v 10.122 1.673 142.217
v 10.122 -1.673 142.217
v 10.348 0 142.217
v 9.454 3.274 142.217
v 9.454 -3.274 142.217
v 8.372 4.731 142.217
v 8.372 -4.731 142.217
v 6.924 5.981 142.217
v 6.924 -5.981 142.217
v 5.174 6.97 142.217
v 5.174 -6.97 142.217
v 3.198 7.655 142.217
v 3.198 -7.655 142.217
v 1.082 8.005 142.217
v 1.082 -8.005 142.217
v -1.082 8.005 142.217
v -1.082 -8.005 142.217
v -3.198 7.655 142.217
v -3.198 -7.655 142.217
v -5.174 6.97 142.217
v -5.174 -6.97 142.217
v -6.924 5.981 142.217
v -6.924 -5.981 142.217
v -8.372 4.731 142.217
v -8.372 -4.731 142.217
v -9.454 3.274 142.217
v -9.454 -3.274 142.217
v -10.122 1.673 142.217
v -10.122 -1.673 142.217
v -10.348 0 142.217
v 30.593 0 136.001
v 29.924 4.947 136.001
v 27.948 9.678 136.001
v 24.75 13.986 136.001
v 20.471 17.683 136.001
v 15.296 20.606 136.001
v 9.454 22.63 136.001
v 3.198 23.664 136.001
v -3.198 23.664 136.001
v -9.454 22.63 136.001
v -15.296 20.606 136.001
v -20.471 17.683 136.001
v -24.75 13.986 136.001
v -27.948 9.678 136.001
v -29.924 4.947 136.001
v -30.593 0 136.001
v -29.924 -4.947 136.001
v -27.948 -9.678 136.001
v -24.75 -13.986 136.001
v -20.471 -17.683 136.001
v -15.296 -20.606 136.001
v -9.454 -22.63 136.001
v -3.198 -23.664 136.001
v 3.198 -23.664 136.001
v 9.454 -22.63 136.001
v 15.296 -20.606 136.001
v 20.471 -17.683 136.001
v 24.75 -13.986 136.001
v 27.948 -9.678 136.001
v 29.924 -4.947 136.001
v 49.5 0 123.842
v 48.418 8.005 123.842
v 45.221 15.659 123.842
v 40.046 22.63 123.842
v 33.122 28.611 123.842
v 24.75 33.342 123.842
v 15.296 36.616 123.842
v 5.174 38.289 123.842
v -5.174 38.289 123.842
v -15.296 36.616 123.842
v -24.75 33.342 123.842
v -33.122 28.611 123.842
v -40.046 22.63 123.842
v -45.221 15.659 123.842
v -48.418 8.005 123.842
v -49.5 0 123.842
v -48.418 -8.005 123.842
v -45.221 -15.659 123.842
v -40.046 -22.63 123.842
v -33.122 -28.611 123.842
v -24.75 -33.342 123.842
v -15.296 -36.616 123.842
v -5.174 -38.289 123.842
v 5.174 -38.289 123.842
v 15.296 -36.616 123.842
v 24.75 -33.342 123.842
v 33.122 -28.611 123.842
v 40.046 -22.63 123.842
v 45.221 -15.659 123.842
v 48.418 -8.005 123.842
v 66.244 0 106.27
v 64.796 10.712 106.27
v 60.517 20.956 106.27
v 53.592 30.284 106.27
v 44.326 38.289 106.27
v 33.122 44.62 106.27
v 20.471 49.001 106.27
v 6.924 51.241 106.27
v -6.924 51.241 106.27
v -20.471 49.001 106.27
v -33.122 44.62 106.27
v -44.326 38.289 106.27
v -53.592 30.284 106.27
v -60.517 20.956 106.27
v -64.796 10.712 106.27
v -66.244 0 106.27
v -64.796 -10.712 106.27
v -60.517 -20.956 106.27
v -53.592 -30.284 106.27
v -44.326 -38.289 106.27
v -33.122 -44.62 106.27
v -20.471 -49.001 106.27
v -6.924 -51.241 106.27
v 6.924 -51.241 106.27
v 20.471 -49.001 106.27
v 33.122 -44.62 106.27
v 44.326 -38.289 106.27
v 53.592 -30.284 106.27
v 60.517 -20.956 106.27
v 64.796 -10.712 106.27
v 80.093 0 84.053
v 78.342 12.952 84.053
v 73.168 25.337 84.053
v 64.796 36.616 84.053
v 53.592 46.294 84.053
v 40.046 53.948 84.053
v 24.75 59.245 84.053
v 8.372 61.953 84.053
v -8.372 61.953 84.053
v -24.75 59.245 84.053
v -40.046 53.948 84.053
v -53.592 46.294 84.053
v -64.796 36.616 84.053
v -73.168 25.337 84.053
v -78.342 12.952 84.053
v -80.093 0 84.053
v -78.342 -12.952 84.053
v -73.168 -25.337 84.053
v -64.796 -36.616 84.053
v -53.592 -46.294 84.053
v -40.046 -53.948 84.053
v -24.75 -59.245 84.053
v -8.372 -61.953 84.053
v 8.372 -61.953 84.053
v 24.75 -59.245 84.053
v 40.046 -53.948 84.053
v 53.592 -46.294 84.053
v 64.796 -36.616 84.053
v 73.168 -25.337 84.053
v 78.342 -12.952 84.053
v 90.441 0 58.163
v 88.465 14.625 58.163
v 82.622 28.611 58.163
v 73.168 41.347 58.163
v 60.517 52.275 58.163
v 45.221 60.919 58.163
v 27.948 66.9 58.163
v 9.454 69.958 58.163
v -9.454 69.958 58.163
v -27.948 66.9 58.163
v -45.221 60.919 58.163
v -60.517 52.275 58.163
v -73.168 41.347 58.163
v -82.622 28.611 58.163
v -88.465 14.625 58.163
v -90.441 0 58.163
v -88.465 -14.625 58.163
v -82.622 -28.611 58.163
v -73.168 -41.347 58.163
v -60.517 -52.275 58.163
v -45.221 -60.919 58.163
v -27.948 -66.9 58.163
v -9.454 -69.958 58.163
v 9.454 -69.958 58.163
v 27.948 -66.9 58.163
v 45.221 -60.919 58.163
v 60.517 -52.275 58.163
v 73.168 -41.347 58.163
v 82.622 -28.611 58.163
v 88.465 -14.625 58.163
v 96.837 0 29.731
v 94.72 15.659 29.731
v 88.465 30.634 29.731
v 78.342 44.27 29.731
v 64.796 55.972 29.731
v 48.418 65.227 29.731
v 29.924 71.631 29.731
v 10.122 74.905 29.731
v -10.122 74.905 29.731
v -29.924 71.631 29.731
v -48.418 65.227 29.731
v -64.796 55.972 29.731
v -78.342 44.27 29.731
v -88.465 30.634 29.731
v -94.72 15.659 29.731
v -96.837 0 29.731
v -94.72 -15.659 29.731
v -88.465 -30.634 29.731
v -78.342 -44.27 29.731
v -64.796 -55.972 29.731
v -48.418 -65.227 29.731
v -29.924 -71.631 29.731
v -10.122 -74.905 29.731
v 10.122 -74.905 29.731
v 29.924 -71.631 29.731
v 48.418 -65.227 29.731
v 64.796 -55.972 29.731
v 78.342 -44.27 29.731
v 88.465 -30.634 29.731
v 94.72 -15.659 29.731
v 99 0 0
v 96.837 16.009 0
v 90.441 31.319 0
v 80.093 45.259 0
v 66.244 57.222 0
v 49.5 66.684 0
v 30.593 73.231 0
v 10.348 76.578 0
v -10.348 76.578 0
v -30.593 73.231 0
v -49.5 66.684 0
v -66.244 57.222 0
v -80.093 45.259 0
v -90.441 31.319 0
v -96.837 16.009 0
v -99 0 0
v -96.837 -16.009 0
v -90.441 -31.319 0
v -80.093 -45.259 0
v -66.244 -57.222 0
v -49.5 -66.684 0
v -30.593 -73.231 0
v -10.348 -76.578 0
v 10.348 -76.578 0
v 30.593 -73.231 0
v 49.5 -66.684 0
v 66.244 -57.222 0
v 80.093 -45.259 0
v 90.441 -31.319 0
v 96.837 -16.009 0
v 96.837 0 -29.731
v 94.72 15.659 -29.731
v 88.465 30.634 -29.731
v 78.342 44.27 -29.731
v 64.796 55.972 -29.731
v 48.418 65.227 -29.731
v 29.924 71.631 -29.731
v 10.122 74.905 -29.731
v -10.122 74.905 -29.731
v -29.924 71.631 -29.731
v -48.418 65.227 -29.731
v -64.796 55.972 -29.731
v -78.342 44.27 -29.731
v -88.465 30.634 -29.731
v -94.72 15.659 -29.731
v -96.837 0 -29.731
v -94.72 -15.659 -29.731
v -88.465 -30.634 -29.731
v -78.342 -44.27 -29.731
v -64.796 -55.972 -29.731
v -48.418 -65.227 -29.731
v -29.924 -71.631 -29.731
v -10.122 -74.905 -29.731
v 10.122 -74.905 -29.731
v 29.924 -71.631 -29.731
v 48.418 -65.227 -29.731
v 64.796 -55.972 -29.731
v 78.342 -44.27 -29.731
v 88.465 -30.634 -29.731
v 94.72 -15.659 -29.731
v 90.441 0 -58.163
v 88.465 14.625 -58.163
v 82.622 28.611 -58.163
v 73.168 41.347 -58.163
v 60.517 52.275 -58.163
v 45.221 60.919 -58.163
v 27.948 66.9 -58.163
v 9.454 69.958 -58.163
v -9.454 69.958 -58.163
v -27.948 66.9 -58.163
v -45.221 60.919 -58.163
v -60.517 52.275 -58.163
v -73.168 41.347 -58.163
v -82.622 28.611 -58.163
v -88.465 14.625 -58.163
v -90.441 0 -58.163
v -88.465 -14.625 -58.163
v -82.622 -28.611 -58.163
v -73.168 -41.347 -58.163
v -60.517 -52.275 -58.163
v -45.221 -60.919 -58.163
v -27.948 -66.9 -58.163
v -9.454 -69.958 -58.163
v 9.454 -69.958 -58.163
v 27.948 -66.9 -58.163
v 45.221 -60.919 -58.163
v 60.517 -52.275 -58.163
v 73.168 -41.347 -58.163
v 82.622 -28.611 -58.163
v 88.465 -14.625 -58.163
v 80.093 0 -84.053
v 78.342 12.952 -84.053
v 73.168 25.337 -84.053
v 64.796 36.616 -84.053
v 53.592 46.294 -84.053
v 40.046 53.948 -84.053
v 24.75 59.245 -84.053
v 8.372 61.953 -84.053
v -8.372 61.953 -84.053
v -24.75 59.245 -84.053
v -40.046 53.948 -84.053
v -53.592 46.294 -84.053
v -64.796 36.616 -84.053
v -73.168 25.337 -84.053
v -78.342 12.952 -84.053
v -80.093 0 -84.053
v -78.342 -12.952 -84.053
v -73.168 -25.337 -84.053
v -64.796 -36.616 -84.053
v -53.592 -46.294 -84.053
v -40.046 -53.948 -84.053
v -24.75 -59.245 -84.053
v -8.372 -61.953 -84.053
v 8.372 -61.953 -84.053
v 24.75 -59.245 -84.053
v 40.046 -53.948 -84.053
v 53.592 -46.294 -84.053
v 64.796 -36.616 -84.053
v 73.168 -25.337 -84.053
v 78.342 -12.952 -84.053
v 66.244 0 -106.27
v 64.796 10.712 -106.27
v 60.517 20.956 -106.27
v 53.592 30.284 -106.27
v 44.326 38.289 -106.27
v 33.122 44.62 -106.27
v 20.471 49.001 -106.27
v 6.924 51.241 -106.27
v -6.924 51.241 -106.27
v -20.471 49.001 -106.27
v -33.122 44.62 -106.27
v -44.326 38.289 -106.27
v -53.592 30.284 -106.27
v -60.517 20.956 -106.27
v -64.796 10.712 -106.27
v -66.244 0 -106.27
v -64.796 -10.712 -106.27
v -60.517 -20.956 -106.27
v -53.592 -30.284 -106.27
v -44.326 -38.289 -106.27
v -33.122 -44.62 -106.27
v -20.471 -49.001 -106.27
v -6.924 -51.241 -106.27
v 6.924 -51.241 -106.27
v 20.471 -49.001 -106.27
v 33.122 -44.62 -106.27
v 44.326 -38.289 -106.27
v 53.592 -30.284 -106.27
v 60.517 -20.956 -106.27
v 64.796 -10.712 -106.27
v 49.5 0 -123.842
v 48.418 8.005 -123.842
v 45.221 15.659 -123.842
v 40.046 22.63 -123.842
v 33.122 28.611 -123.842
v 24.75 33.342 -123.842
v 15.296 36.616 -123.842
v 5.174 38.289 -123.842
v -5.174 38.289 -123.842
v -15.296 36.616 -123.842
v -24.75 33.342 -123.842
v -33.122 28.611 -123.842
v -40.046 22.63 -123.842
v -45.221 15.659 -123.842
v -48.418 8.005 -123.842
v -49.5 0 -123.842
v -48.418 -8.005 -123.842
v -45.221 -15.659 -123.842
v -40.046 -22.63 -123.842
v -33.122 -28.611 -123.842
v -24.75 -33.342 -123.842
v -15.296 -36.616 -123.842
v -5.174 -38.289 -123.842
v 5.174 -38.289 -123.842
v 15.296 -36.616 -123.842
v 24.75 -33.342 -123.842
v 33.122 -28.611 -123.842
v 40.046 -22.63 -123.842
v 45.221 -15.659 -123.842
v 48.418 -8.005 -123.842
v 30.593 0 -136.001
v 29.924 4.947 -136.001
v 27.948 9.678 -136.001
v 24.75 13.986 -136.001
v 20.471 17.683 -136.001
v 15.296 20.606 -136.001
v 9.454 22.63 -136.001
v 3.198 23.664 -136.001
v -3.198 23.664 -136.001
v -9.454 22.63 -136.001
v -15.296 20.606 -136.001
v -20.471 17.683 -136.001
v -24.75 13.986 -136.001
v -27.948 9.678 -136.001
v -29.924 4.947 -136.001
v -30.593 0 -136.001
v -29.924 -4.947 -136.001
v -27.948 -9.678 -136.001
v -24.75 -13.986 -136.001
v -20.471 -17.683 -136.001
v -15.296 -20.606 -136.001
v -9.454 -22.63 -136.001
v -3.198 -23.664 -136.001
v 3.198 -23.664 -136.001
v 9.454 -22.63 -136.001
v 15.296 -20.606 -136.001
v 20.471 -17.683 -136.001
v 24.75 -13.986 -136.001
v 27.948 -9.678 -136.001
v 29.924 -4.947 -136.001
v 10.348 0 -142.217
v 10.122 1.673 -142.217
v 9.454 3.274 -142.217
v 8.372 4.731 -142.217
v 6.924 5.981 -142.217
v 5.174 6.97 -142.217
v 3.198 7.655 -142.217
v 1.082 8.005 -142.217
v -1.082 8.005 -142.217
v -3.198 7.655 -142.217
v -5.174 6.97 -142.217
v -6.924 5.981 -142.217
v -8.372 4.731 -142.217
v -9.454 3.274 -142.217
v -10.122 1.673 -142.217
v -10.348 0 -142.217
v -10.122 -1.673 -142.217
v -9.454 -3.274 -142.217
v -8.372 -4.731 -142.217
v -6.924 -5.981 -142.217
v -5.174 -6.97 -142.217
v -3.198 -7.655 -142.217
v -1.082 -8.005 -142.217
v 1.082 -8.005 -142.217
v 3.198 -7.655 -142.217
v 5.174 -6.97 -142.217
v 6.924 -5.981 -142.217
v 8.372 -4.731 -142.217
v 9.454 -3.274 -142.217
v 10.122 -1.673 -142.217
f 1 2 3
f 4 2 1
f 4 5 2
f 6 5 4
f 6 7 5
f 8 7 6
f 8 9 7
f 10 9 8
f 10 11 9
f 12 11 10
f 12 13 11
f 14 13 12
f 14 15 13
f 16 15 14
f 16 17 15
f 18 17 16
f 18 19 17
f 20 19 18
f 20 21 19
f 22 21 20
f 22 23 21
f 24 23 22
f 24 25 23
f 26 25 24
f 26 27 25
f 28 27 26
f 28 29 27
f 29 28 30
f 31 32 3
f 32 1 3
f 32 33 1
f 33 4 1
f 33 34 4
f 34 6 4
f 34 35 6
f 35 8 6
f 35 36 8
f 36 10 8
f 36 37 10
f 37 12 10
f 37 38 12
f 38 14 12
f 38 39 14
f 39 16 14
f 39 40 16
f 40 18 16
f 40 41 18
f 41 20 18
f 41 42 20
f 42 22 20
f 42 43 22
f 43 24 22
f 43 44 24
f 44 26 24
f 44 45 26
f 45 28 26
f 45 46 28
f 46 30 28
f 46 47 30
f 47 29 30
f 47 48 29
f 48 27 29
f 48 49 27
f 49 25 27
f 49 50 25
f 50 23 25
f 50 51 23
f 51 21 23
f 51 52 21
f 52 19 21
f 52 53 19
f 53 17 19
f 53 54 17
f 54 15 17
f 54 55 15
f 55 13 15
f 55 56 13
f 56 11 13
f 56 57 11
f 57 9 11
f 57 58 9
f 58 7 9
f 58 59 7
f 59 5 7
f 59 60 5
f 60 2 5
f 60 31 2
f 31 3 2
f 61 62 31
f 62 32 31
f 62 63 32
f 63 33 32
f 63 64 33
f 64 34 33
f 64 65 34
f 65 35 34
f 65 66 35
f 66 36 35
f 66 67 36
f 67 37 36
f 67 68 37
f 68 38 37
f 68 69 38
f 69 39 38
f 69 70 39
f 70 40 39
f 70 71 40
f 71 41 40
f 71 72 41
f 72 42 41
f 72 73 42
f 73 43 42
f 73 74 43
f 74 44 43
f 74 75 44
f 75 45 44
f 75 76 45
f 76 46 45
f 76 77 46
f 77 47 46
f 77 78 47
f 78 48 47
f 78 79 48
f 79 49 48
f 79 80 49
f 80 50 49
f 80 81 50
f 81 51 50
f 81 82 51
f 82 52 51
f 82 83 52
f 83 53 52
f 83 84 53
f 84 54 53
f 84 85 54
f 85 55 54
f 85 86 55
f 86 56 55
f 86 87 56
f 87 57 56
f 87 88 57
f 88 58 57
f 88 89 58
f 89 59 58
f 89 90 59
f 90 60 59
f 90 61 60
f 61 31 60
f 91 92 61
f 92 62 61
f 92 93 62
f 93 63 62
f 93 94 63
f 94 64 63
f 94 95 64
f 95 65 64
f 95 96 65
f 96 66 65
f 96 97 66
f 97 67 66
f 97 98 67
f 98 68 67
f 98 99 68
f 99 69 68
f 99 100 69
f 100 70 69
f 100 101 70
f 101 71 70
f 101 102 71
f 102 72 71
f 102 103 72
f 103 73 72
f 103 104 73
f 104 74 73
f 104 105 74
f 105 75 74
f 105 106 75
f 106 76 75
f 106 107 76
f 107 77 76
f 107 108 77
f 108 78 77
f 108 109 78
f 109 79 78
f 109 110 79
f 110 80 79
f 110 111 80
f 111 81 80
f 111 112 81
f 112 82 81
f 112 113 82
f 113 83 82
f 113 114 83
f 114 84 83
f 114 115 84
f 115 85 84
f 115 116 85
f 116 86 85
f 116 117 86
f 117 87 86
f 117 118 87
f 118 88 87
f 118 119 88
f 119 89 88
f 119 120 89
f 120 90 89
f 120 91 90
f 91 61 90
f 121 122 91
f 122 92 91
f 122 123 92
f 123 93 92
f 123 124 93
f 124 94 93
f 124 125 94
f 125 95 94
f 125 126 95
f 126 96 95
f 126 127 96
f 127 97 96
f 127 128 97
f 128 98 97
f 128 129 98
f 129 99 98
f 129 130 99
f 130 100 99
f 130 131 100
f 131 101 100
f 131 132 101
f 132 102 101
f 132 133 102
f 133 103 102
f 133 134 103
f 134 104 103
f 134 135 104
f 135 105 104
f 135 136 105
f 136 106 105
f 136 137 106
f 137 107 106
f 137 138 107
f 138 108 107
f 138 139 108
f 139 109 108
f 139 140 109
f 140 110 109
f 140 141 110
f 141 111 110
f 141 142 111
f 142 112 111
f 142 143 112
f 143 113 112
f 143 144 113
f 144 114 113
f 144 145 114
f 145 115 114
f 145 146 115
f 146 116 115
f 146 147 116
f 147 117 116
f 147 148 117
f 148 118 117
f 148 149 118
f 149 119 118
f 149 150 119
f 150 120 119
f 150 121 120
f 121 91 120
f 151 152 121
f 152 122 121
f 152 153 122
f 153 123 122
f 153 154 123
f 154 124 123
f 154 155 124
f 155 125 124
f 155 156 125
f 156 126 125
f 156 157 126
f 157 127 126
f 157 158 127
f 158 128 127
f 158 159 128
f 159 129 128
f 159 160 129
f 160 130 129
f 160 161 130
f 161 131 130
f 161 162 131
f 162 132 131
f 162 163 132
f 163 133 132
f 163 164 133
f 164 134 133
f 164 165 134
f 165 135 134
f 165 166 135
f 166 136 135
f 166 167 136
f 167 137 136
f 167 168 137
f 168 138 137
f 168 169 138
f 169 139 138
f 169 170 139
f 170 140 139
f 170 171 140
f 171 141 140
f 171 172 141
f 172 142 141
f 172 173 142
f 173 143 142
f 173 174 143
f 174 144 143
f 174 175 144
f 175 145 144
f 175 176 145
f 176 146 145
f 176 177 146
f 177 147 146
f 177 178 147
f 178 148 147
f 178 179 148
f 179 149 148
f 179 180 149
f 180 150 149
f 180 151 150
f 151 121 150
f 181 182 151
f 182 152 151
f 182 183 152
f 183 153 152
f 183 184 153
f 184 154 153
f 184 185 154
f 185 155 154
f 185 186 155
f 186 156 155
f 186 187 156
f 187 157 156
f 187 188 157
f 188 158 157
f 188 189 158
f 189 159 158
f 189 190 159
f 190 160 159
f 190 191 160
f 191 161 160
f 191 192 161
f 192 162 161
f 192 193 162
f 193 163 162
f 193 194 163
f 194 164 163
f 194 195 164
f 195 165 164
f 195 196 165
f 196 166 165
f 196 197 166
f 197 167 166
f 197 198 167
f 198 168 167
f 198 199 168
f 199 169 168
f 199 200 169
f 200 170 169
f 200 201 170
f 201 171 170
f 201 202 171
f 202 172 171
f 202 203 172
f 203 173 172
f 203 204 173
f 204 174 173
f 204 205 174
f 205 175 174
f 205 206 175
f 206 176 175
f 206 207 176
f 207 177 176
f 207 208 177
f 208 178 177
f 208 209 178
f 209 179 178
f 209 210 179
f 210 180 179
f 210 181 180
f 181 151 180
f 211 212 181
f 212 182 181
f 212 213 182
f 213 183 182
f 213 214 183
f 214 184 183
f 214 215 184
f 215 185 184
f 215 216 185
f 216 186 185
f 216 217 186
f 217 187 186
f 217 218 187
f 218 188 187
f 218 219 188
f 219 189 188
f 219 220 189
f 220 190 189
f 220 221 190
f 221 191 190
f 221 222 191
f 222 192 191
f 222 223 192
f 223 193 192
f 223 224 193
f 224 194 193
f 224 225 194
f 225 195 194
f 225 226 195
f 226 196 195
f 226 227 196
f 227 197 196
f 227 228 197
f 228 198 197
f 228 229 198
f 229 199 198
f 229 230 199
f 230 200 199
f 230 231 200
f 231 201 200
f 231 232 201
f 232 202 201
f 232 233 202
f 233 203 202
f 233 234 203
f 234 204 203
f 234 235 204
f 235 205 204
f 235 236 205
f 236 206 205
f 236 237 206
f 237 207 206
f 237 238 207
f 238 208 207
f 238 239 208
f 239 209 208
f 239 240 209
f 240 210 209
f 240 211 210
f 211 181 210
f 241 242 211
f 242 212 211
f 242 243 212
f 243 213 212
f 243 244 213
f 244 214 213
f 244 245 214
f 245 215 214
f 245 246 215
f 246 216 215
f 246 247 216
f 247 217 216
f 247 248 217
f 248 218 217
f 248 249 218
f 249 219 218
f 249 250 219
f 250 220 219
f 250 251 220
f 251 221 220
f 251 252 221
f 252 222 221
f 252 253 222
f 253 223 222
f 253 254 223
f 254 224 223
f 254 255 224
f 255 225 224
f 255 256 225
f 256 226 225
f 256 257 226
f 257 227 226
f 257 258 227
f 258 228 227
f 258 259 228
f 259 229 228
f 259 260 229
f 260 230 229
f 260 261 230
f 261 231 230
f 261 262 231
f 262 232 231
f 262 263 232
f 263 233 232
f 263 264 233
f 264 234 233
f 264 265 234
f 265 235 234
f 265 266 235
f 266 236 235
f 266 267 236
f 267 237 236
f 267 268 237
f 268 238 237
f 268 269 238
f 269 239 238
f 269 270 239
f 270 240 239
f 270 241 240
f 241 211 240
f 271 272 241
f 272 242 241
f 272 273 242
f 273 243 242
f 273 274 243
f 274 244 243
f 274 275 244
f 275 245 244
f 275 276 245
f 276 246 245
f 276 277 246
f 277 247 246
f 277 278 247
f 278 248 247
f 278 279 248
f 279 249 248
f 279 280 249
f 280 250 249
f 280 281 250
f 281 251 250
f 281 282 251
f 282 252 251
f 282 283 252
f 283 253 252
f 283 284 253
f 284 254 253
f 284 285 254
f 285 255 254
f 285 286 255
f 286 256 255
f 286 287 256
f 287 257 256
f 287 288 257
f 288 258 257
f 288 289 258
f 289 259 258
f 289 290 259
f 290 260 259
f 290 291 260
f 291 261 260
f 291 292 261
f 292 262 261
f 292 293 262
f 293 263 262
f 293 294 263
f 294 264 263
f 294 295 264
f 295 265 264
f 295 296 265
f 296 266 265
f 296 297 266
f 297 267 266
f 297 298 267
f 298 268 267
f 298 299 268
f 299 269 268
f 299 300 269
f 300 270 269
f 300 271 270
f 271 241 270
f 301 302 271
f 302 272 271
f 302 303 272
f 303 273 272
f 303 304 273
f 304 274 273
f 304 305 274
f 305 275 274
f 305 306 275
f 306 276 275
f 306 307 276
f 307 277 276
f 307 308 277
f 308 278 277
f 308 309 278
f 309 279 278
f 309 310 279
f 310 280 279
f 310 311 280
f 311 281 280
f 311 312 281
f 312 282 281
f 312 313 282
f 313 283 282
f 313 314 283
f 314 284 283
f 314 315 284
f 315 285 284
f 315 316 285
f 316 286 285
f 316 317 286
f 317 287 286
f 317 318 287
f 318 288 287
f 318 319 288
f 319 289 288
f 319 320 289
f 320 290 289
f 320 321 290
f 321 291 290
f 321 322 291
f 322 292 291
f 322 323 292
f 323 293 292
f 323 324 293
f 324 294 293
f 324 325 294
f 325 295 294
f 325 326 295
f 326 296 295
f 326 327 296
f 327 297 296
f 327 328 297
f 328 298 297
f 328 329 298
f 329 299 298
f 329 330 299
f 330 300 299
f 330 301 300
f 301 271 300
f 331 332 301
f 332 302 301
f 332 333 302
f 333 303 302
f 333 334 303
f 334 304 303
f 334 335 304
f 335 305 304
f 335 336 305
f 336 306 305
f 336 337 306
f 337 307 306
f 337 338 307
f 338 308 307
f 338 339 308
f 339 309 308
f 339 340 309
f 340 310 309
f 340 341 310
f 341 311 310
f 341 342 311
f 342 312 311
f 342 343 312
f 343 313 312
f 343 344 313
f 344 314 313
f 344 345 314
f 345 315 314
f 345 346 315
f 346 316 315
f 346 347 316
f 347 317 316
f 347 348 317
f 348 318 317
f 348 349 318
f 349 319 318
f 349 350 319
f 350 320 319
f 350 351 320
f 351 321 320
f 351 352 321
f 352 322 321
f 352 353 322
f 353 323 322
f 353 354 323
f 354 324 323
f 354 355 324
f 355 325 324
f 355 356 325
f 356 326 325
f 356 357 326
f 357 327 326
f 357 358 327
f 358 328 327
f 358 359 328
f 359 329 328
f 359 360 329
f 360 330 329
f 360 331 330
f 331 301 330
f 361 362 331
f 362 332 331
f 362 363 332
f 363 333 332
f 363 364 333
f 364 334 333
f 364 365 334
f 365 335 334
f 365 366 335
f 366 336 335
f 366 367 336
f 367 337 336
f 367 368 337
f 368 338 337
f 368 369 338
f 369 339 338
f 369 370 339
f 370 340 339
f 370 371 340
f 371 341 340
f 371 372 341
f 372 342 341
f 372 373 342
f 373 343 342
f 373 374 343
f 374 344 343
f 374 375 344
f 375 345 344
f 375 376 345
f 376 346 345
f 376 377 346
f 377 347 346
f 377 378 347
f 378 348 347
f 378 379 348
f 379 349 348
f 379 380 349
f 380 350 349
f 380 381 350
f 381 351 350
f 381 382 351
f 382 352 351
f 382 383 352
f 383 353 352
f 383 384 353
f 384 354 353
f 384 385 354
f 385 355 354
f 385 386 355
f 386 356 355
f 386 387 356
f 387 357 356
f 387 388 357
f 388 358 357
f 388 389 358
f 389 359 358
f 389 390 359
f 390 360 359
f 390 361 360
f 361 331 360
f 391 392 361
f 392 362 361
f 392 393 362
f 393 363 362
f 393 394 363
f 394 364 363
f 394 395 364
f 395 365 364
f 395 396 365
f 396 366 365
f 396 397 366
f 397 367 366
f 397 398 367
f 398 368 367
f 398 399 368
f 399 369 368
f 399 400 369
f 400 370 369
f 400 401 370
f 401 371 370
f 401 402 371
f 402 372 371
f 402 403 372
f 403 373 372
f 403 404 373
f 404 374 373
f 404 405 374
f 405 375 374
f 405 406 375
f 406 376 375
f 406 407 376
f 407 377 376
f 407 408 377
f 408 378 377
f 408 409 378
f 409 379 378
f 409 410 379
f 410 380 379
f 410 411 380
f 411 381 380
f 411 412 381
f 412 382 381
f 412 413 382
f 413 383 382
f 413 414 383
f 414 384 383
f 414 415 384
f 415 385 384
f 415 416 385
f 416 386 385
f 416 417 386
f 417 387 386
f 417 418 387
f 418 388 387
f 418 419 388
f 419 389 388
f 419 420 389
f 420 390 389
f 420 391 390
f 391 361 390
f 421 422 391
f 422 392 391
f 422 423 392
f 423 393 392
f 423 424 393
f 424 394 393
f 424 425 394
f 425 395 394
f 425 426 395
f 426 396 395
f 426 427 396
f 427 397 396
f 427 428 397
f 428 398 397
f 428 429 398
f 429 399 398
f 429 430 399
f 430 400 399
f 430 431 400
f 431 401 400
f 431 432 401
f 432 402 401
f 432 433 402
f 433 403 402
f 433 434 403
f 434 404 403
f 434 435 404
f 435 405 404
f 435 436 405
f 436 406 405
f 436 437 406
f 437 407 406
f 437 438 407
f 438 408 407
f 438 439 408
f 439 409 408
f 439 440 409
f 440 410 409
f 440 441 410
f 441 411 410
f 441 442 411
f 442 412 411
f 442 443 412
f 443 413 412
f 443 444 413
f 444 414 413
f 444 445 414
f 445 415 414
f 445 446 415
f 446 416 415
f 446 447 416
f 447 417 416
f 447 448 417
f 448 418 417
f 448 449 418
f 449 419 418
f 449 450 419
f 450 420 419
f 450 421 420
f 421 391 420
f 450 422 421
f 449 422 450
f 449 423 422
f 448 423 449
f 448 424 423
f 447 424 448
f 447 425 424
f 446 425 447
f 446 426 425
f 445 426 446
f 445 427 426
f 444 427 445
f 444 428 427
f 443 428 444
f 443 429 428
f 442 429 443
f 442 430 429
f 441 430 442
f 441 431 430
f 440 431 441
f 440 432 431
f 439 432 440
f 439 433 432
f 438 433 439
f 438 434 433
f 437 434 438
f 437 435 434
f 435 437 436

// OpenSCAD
// Generated by SolidPython 1.0.1 on 2020-07-29 00:46:48


scale(v = [9, 7, 13]) {
	sphere(r = 11);
}
/***********************************************
*********      SolidPython code:      **********
************************************************
 
# import packages: SolidPython
from solid import *
from solid.utils import *
from itertools import chain, combinations, permutations


class Resize:

    def __init__(self, scad_file):
        self.scad_file = scad_file
        #self.scad_file = import_scad(scad_file)
        # cone/cylinder param:
        self.r1 = 0
        self.r2 = 0
        self.h = 0
        # rectangular prism param:
        self.w = 0
        self.l = 0
        # ellipse param:
        self.r = 0

    # import OpenScad code (file name corresponds to shape)


    # classify shape + parameters
    def assign(self, param1, param2, param3):
        if self.scad_file == 'cone.scad':
            self.r1 = param1
            self.r2 = param2
            self.h = param3
        elif self.scad_file == 'cylinder.scad':
            self.r1 = param1
            self.r2 = param2
            self.h = param3
        elif self.scad_file == 'rectangularPrism.scad':
            self.h = param1
            self.l = param2
            self.w = param3
        else:
            self.r = param1
            self.h = param2

    # resize parameters
    def iterate(self):
        x = range(3, 20, 2)
        i = 1
        if self.scad_file == 'cone.scad':
            tempList = list(permutations(x, 2))
            for temp in tempList:
                param1 = temp[0]
                param2 = temp[1]
                filepath = 'produced_scad_files/' + 'cone' + str(param1) + '_' + str(param2) + '_' + '.scad'
                scad_render_to_file(cylinder(h=param1, r1=param2, r2=0), filepath)

        elif self.scad_file == 'cylinder.scad':
            tempList = list(permutations(x, 3))
            for temp in tempList:
                param1 = temp[0]
                param2 = temp[1]
                filepath = 'produced_scad_files/' + 'cylinder' + str(param1) + '_' + str(param2) + '_' + '.scad'
                scad_render_to_file(cylinder(h=param1, r1=param2, r2=param2), filepath)

        elif self.scad_file == 'rectangularPrism.scad':
            tempList = list(permutations(x, 3))
            for temp in tempList:
                param1 = temp[0]
                param2 = temp[1]
                param3 = temp[2]
                filepath = 'produced_scad_files/' + 'rectangularPrism' + str(param1) + '_' + str(param2) + '_' + str(
                    param3) + '.scad'
                scad_render_to_file(cube(size=(param1, param2, param3)), filepath)

        elif self.scad_file == 'ellipse.scad':
            tempList = list(permutations(x, 4))
            for temp in tempList:
                param1 = temp[0]
                param2 = temp[1]
                param3 = temp[2]
                param4 = temp[3]
                filepath = 'produced_scad_files/' + 'ellipse' + str(param1) + '_' + str(param2) + '_' + str(param3) + '_' + str(param4) + '.scad'
                scad_render_to_file(scale([param1, param2, param3])(sphere(r=param4)), filepath)

    def render_to_scadfile(self):
        scad_render_to_file(scad, 'example.scad') 
 
************************************************/
